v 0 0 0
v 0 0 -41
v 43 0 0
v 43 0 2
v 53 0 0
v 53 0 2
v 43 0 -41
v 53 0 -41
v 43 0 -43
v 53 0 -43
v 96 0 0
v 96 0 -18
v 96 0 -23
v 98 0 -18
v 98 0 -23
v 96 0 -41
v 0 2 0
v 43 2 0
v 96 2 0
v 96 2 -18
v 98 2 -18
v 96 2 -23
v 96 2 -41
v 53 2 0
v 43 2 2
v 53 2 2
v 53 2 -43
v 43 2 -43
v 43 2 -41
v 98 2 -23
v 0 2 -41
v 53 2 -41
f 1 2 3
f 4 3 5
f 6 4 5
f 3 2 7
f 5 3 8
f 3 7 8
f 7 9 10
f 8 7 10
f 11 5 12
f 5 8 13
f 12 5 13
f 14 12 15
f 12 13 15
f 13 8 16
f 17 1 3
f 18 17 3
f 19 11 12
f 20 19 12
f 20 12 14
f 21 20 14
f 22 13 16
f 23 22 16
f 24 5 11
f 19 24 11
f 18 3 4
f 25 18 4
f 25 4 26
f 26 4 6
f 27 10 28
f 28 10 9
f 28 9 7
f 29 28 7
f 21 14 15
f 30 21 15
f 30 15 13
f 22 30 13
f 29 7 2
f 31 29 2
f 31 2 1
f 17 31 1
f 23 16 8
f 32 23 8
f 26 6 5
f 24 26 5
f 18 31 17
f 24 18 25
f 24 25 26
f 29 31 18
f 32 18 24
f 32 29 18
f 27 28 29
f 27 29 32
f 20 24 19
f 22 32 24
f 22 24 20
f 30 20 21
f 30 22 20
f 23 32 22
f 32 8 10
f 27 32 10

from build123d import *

# Parameters (mm, degrees)
BOSS_EXTRUDE1_DEPTH = 2


with BuildPart() as part:
    # Sketch1 → Boss-Extrude1 (new body)
    with BuildSketch(Plane(origin=(0, 0, 0), x_dir=(1, 0, 0), z_dir=(0, 1, 0))):
        Polygon((0, 0), (43, 0), (43, -2), (53, -2), (53, 0), (96, 0), (96, 18), (98, 18), (98, 23), (96, 23), (96, 41), (53, 41), (53, 43), (43, 43), (43, 41), (0, 41), align=None)
    extrude(amount=BOSS_EXTRUDE1_DEPTH)


solid = part.part
